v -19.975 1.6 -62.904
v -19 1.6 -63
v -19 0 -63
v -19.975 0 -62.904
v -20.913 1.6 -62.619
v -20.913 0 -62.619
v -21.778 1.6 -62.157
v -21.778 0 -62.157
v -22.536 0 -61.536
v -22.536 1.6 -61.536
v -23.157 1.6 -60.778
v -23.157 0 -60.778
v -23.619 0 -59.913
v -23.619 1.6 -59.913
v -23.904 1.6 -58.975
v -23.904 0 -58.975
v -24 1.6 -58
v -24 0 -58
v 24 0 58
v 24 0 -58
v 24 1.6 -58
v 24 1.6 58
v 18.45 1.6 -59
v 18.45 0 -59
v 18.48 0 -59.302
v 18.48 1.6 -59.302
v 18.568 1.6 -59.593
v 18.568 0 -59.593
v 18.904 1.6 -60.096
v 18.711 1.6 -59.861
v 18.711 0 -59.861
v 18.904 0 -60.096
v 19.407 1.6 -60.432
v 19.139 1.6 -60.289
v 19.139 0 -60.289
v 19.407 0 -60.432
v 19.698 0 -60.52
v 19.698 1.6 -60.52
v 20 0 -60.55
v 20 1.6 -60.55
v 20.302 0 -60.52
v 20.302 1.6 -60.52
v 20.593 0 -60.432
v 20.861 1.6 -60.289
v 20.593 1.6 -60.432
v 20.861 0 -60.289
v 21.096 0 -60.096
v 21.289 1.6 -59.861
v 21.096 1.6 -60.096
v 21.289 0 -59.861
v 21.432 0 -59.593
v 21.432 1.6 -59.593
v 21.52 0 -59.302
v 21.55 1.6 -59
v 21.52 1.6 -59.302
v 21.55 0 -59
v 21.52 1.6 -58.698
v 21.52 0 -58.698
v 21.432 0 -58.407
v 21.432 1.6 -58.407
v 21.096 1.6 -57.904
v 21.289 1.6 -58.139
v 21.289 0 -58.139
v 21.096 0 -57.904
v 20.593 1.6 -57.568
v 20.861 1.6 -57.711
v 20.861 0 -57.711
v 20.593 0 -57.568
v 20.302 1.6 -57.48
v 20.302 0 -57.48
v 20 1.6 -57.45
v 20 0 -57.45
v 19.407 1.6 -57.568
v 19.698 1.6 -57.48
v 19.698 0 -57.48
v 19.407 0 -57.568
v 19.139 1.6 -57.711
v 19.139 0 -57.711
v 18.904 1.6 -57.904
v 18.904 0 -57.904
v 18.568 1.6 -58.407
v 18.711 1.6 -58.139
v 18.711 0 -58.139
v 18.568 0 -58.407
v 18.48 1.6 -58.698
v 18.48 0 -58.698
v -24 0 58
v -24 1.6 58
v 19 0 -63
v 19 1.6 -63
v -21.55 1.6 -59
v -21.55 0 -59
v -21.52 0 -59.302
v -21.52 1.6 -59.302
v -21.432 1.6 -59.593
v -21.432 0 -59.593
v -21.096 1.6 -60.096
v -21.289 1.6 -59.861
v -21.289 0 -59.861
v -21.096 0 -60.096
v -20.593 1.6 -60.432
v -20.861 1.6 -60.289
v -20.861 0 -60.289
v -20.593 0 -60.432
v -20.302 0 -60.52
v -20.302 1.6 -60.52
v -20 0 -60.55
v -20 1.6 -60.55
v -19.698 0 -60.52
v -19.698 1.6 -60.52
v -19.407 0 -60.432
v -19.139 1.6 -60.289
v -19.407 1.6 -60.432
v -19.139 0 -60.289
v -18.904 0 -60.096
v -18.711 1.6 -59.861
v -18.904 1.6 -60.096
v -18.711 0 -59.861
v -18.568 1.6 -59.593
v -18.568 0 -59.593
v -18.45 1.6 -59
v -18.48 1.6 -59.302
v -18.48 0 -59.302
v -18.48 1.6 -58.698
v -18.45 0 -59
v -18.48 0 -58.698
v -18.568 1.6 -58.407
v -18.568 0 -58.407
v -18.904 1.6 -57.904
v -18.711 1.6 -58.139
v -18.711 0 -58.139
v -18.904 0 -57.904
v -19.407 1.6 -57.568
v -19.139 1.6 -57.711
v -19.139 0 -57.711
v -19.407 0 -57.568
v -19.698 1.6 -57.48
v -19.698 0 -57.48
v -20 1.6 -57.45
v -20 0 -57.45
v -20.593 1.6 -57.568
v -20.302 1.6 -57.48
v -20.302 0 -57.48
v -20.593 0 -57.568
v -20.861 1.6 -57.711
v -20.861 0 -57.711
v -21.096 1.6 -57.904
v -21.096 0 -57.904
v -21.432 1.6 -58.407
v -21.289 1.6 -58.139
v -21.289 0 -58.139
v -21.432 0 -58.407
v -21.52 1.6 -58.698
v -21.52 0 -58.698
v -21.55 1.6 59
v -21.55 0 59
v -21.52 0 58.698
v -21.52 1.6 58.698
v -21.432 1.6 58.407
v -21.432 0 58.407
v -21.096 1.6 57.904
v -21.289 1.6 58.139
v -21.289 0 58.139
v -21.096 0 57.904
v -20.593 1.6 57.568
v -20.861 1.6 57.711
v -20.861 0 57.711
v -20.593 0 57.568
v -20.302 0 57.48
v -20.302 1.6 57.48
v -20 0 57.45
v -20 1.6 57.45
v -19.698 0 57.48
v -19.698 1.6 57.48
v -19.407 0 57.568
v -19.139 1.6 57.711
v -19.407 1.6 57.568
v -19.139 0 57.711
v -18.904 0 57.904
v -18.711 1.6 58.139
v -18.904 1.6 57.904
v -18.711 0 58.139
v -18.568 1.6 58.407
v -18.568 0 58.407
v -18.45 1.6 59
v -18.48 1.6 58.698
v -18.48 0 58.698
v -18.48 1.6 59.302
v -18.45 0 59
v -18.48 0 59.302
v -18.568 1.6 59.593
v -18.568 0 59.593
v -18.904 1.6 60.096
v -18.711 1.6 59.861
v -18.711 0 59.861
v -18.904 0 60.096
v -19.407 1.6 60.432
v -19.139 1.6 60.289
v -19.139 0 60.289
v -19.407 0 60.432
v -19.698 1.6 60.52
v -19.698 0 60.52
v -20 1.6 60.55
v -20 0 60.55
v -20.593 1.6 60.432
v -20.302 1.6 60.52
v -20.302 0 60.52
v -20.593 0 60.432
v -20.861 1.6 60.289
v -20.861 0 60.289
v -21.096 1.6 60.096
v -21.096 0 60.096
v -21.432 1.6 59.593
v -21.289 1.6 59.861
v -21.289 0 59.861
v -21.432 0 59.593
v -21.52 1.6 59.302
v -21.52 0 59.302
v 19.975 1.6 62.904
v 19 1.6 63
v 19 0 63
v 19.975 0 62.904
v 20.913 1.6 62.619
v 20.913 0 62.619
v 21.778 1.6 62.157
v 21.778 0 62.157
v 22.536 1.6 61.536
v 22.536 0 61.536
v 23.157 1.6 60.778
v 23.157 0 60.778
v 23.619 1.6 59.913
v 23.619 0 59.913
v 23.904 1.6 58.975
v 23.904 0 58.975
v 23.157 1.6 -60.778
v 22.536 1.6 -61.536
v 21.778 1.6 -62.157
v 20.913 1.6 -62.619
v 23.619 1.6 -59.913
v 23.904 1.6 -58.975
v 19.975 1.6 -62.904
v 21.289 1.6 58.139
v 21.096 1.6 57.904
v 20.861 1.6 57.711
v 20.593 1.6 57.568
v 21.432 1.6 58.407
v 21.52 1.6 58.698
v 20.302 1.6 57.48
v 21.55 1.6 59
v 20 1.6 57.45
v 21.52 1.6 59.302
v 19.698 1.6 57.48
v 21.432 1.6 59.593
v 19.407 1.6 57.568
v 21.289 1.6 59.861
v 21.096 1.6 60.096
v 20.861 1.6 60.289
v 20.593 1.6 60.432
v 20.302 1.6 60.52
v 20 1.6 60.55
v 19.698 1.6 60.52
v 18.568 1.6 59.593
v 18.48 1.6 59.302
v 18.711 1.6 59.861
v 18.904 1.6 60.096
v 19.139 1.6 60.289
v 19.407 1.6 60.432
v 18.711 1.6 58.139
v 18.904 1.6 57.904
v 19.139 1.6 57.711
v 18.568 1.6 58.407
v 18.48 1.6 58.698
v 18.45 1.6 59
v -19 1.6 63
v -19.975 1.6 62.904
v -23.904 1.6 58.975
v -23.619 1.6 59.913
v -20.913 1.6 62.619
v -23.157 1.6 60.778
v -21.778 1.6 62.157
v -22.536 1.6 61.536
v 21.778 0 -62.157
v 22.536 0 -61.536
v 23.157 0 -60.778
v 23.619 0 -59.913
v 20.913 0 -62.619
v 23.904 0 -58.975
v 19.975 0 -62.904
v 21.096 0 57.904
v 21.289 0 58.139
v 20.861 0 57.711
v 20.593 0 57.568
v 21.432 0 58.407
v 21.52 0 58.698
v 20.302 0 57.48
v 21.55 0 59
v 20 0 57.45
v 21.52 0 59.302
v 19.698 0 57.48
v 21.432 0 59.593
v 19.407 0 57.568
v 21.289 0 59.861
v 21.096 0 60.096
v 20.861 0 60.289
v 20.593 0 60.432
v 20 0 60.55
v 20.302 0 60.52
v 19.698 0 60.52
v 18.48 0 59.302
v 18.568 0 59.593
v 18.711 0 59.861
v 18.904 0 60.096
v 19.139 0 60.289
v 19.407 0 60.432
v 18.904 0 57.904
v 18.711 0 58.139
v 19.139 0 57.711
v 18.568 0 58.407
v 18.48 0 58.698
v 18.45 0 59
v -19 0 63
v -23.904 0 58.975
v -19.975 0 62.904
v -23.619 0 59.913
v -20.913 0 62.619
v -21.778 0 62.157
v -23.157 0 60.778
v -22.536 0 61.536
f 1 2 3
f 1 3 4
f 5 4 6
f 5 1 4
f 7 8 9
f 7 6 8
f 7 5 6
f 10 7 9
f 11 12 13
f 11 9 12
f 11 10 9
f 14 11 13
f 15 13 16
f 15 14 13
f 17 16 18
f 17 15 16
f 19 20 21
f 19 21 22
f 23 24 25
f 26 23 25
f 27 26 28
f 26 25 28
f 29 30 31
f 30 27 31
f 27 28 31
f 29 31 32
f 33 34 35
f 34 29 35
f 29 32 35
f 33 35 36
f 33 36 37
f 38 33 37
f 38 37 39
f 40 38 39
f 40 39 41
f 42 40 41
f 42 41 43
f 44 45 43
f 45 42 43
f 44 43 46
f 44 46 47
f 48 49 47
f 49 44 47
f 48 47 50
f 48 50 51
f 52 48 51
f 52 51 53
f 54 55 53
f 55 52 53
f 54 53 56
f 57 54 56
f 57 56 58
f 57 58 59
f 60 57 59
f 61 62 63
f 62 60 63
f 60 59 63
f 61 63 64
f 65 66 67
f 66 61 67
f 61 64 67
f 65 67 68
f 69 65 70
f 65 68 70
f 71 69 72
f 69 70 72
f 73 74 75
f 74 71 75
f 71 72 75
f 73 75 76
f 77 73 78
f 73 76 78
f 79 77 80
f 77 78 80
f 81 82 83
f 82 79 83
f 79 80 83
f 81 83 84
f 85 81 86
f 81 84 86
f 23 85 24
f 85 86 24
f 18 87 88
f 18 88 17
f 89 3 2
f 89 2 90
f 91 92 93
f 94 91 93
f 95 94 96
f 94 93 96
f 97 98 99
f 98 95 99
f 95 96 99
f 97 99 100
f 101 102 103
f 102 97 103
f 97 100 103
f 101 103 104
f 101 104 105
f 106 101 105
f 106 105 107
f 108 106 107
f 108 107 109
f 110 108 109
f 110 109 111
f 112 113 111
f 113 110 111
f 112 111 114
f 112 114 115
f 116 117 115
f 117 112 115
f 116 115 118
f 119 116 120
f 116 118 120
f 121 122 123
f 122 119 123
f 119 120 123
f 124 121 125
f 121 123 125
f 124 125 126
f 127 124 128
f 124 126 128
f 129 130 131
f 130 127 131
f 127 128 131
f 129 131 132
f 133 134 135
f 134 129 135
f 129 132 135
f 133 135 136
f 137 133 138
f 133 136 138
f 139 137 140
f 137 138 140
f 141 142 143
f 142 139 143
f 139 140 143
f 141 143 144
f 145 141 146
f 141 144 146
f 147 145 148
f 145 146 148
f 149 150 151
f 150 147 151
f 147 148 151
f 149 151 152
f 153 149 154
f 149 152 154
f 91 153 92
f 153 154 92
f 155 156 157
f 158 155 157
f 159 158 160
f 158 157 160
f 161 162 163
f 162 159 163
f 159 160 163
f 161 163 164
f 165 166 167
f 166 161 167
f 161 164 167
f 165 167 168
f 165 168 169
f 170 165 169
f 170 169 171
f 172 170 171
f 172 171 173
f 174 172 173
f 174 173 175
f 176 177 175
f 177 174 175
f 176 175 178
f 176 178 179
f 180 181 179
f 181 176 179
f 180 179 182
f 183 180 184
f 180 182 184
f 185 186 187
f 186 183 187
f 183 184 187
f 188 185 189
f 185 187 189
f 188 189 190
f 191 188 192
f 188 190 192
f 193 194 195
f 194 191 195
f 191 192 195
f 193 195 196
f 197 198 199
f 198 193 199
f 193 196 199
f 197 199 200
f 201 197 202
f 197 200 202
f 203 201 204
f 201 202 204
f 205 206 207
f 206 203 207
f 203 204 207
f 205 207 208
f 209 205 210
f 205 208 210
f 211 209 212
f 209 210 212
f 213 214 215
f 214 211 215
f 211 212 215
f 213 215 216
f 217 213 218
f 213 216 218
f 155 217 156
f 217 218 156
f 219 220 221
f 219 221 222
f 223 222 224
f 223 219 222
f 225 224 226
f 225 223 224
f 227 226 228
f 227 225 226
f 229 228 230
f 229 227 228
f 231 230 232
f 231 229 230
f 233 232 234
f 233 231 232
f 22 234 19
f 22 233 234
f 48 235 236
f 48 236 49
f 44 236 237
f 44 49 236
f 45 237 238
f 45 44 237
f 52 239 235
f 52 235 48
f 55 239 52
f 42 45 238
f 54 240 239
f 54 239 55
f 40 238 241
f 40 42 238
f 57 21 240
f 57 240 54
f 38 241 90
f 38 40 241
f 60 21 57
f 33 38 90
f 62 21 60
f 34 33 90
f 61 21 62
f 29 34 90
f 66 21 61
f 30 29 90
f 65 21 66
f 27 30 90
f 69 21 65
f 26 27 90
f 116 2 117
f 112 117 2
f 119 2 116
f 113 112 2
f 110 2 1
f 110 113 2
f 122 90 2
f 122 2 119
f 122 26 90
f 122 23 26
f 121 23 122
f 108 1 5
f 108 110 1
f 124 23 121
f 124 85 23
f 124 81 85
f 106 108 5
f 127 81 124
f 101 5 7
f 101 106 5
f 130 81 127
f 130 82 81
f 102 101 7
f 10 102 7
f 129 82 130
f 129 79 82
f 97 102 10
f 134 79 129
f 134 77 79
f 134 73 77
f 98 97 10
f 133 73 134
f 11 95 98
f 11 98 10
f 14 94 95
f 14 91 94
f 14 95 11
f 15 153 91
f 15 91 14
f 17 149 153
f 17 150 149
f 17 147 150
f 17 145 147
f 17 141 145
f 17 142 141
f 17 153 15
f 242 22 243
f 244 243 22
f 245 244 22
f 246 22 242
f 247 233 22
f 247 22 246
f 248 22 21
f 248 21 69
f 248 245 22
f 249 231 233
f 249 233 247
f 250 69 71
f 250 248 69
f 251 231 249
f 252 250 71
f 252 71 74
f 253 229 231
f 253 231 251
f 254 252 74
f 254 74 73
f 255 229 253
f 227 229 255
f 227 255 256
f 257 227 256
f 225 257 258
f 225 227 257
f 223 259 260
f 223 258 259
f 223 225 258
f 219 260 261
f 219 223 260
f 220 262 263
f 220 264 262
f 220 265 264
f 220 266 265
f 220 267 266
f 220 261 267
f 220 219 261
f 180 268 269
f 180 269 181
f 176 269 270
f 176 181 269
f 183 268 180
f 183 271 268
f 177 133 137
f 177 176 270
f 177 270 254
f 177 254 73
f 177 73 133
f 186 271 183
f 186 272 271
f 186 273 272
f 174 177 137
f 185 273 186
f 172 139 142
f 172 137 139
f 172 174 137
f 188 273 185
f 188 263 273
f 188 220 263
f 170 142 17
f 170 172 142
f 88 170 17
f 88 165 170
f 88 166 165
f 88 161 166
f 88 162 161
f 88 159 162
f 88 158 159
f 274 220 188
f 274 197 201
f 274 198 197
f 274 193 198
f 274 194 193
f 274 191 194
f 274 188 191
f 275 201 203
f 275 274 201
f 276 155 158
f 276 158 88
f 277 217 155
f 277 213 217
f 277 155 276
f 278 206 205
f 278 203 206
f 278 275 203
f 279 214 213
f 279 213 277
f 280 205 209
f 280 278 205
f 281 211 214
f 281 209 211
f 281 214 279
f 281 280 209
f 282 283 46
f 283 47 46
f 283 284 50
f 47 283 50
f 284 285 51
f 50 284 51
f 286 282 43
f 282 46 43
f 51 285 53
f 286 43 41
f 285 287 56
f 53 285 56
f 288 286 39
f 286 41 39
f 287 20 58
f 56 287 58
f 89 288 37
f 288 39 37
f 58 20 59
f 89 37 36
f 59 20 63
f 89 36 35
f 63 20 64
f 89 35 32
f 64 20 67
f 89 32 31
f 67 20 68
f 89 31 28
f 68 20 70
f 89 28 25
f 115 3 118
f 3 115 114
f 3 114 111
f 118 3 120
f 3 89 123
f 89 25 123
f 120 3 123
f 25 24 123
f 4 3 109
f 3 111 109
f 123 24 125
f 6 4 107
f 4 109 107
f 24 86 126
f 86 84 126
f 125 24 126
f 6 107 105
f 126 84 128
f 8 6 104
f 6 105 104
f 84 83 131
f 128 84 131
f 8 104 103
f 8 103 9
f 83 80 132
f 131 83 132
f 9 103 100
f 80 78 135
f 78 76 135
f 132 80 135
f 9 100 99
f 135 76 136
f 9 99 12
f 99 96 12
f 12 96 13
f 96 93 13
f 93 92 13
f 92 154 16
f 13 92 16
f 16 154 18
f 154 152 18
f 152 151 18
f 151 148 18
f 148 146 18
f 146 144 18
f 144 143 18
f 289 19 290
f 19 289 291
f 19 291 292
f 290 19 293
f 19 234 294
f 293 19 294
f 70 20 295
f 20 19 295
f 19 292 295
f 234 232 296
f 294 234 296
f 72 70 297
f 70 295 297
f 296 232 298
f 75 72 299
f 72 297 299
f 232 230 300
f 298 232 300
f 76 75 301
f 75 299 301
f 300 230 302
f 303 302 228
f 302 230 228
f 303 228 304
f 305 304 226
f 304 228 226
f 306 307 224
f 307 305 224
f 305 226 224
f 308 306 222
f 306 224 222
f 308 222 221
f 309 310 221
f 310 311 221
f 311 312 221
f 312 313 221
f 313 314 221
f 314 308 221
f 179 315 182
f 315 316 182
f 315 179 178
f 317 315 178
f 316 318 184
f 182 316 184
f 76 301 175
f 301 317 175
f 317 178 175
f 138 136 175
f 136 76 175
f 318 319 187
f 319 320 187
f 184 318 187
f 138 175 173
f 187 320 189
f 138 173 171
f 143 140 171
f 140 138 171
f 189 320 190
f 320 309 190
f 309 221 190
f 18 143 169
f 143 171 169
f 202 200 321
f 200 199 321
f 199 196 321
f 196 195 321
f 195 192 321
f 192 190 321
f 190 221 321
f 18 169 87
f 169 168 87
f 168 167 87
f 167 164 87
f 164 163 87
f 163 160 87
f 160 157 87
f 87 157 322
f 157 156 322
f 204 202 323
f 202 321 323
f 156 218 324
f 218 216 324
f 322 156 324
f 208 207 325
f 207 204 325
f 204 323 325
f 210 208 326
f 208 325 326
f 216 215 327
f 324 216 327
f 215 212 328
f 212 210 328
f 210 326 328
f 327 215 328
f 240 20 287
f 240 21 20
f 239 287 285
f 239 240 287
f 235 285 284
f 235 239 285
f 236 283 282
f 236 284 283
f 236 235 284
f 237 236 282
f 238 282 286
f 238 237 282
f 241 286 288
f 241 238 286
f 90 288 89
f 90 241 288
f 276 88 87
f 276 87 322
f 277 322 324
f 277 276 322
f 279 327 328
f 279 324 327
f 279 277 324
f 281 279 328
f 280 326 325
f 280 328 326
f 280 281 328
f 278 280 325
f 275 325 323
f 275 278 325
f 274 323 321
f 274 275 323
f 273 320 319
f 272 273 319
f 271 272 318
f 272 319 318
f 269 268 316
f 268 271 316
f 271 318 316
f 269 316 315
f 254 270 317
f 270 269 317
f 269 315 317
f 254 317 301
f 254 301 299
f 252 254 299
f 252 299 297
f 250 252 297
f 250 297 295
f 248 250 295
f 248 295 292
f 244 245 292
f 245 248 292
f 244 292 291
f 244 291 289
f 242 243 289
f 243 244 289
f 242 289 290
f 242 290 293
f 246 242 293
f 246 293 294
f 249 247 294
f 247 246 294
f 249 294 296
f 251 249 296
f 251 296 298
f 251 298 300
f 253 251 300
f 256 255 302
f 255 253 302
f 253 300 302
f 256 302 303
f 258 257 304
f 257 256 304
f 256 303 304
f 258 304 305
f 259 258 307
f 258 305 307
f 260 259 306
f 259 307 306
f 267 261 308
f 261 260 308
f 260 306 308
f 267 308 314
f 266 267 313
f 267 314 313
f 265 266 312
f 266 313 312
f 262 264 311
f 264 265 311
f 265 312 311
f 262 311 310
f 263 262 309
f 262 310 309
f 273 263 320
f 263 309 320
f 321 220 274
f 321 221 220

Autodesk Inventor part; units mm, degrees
ref_plane "YZ Plane" through (0, 0, 0) normal (1, 0, 0) x (0, 1, 0)
ref_plane "XZ Plane" through (0, 0, 0) normal (0, 1, 0) x (-1, 0, 0)
ref_plane "XY Plane" through (0, 0, 0) normal (0, 0, 1) x (1, 0, 0)
sketch "Sketch1" plane through (0, 0, 0) normal (0, 1, 0) x (-1, 0, 0)
  line L0 (-24, 63) -> (24, 63)
  line L1 (24, 63) -> (24, -63)
  line L2 (24, -63) -> (-24, -63)
  line L3 (-24, -63) -> (-24, 63)
  line L4 (-24, 63) -> (24, -63) construction
  line L5 (24, 63) -> (-24, -63) construction
  line L6 (-20, 59) -> (20, 59) construction
  line L7 (20, 59) -> (20, -59) construction
  line L8 (20, -59) -> (-20, -59) construction
  line L9 (-20, -59) -> (-20, 59) construction
  line L10 (-20, 59) -> (20, -59) construction
  line L11 (20, 59) -> (-20, -59) construction
  circle A0 centre (20, 59) radius 1.55
  circle A1 centre (20, -59) radius 1.55
  circle A2 centre (-20, -59) radius 1.55
  circle A3 centre (-20, 59) radius 1.55
  point P0 (0, 0)
  dimension "d0" = 126
  dimension "d1" = 48
  dimension "d2" = 3.1
  dimension "d3" = 4
  dimension "d4" = 4
  dimension "d5" = 3.1
  dimension "d6" = 3.1
  dimension "d7" = 3.1
extrude "Extrusion1" add sketch "Sketch1" along normal blind 1.6
fillet "Fillet1" radius 5 4 edges at (24, 0.8, -63) (-24, 0.8, -63) (24, 0.8, 63) (-24, 0.8, 63)
equation "\"d5\" = d2"
equation "\"d6\" = d2"
equation "\"d7\" = d2"
properties part number "Control_PCB"
